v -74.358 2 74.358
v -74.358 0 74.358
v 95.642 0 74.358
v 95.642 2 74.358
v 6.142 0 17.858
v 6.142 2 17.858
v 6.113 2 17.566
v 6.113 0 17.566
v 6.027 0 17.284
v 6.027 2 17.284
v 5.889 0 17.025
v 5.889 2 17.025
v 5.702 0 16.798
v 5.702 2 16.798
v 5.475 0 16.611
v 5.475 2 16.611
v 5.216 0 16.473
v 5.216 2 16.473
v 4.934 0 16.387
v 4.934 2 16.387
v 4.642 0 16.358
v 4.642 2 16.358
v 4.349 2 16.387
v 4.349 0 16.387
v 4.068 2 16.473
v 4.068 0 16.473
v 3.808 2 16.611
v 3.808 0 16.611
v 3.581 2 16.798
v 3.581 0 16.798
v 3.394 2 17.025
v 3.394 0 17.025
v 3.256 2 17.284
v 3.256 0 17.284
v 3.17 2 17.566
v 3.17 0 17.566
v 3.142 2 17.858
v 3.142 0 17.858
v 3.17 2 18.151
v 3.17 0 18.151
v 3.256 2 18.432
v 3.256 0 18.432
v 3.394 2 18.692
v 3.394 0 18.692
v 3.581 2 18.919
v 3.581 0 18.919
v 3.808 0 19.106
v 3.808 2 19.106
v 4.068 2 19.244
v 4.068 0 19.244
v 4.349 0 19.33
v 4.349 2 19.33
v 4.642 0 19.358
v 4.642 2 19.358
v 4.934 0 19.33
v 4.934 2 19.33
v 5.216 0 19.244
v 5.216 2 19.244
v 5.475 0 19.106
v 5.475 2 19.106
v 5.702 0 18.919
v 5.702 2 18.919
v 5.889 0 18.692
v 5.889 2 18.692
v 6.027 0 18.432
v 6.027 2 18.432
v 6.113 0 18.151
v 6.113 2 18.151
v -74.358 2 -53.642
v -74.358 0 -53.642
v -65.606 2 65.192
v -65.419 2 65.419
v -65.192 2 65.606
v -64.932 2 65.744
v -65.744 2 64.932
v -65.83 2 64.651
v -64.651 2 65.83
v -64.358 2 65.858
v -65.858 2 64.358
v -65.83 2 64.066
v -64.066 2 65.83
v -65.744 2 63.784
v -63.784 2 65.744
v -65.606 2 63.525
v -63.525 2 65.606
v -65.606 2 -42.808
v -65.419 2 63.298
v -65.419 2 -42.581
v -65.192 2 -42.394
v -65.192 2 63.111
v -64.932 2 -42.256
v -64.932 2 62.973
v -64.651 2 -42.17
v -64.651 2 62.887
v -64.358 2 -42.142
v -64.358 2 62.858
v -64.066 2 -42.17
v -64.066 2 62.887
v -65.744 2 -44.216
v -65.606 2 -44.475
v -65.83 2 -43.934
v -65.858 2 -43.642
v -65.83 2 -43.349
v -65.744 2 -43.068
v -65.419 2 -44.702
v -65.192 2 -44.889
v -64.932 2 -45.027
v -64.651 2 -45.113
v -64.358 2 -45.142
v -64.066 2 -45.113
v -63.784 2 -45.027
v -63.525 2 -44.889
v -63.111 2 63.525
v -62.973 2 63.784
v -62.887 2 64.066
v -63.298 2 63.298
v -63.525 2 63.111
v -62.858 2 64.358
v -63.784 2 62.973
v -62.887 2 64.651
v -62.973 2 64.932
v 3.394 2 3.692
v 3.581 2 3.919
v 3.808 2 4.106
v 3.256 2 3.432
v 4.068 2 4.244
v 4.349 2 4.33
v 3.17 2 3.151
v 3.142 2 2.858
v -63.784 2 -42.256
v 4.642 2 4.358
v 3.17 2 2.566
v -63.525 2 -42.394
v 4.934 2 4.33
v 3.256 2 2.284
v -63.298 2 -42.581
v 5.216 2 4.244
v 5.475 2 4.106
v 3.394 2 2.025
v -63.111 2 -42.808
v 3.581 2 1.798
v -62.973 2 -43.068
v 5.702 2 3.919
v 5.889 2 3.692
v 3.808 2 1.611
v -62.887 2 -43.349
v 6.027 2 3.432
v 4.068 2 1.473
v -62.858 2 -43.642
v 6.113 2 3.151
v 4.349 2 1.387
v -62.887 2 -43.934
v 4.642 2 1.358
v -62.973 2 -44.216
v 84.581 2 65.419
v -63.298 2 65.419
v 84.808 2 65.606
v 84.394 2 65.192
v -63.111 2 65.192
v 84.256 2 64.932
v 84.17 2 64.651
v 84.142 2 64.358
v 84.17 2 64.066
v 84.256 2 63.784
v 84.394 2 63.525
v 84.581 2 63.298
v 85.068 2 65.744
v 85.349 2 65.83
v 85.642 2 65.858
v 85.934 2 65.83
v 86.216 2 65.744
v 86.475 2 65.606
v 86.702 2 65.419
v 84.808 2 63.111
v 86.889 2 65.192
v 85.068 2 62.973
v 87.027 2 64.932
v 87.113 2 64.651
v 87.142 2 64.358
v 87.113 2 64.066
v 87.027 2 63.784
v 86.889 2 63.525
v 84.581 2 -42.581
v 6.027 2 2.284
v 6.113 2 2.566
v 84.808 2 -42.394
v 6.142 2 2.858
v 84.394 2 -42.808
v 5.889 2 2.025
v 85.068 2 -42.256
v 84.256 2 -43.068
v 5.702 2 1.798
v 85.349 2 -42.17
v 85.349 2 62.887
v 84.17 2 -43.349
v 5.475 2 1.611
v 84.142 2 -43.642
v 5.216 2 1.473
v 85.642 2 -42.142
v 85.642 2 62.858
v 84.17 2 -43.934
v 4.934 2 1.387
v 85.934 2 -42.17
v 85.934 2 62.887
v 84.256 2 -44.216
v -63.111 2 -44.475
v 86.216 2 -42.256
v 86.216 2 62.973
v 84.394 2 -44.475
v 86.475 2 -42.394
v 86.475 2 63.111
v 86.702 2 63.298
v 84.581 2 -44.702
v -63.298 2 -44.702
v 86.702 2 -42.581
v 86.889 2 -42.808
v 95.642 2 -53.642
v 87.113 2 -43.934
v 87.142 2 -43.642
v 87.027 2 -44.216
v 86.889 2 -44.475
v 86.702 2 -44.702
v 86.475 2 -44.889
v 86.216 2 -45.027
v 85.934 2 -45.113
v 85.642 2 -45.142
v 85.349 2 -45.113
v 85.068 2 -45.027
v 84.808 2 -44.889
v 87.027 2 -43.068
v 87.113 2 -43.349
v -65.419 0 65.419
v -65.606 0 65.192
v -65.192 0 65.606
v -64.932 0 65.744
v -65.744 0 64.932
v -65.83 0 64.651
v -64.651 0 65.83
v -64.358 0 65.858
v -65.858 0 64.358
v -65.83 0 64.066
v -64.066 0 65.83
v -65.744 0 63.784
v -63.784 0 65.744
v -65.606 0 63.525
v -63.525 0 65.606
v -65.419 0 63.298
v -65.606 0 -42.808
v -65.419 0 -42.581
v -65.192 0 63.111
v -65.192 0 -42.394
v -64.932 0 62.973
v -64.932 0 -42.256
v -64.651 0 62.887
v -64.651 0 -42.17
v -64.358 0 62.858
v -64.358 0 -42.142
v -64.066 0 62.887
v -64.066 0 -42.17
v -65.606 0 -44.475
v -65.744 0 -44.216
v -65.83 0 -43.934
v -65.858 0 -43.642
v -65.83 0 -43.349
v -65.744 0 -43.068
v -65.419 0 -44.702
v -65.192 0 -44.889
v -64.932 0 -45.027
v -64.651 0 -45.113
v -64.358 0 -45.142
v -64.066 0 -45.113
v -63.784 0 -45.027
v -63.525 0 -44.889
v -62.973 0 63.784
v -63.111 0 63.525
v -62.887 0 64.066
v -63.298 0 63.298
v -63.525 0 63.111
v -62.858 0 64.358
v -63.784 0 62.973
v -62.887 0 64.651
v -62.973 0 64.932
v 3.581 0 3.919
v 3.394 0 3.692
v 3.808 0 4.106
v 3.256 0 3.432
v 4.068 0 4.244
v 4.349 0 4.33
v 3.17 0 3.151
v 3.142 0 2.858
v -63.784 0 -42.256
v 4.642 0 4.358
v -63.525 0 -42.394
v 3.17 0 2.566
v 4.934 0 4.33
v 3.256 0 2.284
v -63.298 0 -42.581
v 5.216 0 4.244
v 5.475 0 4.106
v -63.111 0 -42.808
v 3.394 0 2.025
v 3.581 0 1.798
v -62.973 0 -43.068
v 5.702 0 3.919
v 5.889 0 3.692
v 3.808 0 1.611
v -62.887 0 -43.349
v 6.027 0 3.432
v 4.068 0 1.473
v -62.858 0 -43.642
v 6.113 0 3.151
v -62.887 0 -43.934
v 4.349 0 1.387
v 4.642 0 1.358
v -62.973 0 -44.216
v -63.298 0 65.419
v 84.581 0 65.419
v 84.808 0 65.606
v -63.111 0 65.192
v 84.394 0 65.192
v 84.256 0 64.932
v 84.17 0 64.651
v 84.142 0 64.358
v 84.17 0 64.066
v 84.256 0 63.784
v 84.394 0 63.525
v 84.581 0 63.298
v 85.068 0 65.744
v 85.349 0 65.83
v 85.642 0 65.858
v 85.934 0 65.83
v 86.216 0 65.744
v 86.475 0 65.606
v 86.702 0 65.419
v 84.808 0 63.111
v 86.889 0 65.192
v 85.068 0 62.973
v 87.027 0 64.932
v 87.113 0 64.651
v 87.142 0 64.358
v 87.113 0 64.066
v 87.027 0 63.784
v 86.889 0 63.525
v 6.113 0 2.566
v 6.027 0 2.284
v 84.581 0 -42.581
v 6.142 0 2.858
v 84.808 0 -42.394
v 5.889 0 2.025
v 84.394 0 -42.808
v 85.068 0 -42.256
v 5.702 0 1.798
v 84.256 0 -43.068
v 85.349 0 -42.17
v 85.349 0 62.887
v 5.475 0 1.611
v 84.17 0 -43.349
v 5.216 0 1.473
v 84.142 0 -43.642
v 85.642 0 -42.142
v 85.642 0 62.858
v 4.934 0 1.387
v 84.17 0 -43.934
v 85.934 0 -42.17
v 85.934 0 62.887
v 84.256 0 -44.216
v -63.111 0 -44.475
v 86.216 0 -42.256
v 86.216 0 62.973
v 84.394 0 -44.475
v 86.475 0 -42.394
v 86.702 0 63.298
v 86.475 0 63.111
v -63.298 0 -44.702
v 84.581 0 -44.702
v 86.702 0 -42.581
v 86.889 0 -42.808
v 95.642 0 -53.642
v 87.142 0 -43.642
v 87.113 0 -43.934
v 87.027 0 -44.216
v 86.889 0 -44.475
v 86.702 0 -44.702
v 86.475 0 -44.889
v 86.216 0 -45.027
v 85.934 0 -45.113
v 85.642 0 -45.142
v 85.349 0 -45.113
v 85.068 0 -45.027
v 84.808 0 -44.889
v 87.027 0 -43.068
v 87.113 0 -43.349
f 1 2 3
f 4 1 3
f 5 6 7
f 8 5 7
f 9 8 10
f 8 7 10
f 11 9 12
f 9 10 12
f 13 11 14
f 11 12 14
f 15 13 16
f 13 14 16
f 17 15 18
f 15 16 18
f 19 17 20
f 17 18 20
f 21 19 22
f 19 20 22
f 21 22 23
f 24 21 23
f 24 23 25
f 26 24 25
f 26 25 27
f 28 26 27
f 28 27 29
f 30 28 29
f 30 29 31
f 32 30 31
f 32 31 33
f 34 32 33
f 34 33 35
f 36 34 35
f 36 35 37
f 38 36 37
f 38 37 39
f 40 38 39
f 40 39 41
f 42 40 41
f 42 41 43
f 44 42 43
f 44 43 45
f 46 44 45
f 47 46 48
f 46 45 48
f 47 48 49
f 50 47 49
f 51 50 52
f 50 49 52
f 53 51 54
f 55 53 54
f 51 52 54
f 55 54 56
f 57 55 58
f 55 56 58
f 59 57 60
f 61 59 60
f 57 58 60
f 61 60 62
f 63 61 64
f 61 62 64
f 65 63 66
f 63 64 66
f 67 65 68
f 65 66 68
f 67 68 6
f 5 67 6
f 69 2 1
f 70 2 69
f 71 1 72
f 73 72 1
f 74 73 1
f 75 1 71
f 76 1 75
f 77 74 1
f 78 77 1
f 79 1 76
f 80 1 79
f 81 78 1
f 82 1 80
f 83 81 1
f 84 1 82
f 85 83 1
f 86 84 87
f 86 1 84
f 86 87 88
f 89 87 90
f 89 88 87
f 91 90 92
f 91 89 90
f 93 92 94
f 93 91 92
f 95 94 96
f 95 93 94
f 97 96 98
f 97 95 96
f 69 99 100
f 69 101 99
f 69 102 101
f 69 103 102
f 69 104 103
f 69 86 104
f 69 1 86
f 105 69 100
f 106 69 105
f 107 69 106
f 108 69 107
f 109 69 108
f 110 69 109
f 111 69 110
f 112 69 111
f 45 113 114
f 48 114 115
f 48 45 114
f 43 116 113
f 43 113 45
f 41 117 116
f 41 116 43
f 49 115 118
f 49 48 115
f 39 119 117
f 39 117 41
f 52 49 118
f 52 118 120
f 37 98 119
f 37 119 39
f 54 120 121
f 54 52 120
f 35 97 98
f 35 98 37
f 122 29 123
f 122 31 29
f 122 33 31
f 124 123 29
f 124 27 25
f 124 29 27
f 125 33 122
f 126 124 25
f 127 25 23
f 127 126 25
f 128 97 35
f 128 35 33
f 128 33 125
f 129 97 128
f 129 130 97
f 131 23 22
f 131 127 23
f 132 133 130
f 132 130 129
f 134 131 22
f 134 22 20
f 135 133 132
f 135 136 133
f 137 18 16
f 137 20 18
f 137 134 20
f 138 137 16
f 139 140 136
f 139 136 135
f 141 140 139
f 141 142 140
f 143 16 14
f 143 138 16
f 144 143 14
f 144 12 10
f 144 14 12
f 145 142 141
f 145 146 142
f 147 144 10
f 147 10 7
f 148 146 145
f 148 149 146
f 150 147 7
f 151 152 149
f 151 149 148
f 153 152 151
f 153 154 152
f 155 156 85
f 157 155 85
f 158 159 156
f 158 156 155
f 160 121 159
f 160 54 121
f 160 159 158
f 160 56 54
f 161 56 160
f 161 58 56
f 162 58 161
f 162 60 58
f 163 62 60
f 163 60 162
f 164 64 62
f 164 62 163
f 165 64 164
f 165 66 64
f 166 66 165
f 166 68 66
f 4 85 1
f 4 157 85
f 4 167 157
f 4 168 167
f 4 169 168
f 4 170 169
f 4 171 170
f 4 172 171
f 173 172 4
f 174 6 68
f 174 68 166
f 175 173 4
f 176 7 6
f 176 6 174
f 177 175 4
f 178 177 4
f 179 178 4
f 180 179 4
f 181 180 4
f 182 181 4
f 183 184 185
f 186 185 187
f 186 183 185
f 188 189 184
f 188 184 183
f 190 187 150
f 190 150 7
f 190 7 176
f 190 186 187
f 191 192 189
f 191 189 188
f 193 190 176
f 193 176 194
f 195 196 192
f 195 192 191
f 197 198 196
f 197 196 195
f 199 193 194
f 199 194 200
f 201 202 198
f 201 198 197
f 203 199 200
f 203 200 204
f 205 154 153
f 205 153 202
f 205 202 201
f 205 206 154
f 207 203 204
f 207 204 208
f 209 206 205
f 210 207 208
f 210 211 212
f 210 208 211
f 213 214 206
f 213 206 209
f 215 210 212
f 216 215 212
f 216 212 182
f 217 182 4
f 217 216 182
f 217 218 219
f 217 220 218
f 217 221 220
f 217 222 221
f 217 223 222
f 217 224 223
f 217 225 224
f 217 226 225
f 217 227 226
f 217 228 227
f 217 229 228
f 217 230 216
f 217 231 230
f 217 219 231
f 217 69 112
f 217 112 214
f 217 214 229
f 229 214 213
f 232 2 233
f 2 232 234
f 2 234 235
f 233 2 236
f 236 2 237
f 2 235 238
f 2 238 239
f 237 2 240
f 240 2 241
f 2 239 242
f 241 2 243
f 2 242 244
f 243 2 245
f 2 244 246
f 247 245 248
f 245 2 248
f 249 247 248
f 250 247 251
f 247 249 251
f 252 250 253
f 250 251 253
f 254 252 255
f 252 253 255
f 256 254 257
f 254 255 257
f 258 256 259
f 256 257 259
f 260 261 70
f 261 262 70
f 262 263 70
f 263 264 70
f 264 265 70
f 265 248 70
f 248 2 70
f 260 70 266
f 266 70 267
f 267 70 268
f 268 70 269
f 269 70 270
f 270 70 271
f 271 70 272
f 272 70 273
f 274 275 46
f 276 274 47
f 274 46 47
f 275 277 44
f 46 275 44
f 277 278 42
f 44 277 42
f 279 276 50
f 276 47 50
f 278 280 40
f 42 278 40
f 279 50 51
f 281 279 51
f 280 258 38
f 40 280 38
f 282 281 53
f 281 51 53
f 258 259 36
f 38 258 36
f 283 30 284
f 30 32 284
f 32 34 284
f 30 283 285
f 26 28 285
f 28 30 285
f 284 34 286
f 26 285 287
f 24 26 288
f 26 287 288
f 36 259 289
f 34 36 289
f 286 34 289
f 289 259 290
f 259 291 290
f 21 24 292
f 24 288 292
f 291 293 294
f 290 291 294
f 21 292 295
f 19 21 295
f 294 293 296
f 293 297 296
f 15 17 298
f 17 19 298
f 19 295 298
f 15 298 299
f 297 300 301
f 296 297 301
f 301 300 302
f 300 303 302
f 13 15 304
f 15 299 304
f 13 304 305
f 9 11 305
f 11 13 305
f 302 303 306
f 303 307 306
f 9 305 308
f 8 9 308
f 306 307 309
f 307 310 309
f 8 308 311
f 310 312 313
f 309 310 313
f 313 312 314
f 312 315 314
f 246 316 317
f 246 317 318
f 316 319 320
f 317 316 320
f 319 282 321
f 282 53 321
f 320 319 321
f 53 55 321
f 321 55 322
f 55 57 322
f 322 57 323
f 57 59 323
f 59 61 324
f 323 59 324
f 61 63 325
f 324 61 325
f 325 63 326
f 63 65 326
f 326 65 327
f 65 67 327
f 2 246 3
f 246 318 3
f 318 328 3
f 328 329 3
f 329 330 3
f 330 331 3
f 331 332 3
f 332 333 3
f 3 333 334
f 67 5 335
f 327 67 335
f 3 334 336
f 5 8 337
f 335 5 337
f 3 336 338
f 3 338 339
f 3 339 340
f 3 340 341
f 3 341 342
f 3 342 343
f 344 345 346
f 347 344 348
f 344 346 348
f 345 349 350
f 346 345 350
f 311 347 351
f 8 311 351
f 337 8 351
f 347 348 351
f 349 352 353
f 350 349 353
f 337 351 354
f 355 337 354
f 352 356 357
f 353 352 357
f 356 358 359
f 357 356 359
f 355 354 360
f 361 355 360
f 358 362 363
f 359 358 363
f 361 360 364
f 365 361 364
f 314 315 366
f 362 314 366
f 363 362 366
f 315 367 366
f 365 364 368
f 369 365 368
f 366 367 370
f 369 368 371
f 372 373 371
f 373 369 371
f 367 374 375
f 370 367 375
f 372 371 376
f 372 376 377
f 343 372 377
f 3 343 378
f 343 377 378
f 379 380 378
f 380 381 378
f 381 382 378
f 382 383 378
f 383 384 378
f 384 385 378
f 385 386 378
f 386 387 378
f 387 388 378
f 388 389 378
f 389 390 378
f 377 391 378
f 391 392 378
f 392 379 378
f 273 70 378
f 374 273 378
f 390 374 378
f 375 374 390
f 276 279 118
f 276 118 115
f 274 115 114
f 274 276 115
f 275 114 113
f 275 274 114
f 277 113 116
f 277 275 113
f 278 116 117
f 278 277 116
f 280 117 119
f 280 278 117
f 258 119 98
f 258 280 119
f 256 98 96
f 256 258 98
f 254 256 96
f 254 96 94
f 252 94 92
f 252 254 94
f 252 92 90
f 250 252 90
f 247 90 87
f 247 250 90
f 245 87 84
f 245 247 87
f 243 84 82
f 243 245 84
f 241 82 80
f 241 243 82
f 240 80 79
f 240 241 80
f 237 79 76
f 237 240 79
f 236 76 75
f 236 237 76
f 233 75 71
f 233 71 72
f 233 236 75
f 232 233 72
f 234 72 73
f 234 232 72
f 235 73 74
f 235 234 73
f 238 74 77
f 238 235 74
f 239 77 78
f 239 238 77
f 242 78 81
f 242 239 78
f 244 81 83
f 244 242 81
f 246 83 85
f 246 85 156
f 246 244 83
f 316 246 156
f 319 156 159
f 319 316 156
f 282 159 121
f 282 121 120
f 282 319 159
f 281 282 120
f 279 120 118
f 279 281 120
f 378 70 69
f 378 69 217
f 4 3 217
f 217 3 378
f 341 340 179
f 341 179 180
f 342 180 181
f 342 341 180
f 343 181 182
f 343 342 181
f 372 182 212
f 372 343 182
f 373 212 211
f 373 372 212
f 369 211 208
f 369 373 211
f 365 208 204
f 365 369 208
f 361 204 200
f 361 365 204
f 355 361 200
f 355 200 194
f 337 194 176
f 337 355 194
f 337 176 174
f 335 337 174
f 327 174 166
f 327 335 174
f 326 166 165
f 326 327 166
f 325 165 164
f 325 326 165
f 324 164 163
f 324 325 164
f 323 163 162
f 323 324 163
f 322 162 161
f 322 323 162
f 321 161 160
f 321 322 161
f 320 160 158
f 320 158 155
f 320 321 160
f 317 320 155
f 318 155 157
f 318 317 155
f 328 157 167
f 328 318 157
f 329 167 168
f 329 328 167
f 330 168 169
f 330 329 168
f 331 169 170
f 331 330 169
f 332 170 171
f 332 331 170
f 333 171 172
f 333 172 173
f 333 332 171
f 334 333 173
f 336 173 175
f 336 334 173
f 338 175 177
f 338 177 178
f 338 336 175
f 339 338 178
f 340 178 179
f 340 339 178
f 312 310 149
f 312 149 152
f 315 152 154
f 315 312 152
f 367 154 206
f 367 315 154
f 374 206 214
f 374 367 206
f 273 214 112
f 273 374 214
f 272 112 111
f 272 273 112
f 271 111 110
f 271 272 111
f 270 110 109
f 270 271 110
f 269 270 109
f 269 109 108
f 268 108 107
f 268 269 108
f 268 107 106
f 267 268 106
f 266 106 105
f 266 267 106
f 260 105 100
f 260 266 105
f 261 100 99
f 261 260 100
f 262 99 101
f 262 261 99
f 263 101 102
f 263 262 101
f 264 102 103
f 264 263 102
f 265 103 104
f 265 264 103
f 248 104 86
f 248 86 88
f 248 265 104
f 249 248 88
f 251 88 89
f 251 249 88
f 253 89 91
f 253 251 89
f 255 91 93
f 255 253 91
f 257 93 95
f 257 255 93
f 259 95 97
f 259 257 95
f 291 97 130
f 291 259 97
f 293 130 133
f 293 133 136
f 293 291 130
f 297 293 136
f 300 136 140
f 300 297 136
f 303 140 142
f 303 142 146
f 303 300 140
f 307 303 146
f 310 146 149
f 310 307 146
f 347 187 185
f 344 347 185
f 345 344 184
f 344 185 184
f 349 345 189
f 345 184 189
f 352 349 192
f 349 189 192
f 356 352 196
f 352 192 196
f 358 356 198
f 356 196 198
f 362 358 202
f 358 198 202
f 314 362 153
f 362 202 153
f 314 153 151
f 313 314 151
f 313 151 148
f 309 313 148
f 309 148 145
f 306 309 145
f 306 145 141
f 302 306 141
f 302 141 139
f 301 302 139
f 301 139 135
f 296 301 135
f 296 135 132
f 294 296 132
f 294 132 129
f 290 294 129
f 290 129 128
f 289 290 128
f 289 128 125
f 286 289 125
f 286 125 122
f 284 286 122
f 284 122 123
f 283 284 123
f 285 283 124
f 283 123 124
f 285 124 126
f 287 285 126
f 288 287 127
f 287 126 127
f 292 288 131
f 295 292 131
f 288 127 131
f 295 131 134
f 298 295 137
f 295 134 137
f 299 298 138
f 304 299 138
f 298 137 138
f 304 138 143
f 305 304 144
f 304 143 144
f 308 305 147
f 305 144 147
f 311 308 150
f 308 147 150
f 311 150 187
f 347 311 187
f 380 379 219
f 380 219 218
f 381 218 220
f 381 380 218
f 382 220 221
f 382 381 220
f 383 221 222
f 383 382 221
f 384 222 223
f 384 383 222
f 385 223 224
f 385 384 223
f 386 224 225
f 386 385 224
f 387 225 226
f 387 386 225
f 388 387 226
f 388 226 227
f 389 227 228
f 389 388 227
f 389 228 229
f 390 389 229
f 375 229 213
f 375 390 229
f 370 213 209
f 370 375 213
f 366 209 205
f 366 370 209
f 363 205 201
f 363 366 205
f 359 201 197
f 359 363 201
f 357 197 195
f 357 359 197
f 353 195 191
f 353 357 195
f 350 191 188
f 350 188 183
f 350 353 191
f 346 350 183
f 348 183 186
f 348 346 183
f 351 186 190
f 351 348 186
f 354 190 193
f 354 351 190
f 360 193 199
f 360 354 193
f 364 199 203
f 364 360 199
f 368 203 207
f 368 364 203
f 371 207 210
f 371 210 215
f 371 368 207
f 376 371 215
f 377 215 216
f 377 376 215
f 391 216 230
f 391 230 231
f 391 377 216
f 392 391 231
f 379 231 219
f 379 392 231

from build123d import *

# Parameters (mm, degrees)
SKETCH_1_W          = 170
SKETCH_1_H          = 128
SKETCH_1_R          = 1.5
EXTRUDE_1_DEPTH     = 2
SKETCH_2_R          = 1.5
CUT_EXTRUDE_1_DEPTH = 3


with BuildPart() as part:
    # Эскиз1 → Бобышка-Вытянуть1 (new body)
    with BuildSketch(Plane(origin=(0, 0, 0), x_dir=(1, 0, 0), z_dir=(0, 1, 0))):
        with Locations((10.64154107, -10.35845893)):
            Rectangle(SKETCH_1_W, SKETCH_1_H)
        with Locations((-64.35845893, 43.64154107)):
            Circle(SKETCH_1_R, mode=Mode.SUBTRACT)
        with Locations((85.64154107, 43.64154107)):
            Circle(SKETCH_1_R, mode=Mode.SUBTRACT)
        with Locations((85.64154107, -64.35845893)):
            Circle(SKETCH_1_R, mode=Mode.SUBTRACT)
        with Locations((-64.35845893, -64.35845893)):
            Circle(SKETCH_1_R, mode=Mode.SUBTRACT)
    extrude(amount=EXTRUDE_1_DEPTH)

    # Эскиз2 → Вырез-Вытянуть1 (cut, through all)
    with BuildSketch(Plane(origin=(0, 2, 0), x_dir=(1, 0, 0), z_dir=(0, 1, 0))):
        with Locations((4.64154107, -17.85845893)):
            Circle(SKETCH_2_R)
        with Locations((4.64154107, -2.85845893)):
            Circle(SKETCH_2_R)
    extrude(amount=-CUT_EXTRUDE_1_DEPTH, mode=Mode.SUBTRACT)


solid = part.part
